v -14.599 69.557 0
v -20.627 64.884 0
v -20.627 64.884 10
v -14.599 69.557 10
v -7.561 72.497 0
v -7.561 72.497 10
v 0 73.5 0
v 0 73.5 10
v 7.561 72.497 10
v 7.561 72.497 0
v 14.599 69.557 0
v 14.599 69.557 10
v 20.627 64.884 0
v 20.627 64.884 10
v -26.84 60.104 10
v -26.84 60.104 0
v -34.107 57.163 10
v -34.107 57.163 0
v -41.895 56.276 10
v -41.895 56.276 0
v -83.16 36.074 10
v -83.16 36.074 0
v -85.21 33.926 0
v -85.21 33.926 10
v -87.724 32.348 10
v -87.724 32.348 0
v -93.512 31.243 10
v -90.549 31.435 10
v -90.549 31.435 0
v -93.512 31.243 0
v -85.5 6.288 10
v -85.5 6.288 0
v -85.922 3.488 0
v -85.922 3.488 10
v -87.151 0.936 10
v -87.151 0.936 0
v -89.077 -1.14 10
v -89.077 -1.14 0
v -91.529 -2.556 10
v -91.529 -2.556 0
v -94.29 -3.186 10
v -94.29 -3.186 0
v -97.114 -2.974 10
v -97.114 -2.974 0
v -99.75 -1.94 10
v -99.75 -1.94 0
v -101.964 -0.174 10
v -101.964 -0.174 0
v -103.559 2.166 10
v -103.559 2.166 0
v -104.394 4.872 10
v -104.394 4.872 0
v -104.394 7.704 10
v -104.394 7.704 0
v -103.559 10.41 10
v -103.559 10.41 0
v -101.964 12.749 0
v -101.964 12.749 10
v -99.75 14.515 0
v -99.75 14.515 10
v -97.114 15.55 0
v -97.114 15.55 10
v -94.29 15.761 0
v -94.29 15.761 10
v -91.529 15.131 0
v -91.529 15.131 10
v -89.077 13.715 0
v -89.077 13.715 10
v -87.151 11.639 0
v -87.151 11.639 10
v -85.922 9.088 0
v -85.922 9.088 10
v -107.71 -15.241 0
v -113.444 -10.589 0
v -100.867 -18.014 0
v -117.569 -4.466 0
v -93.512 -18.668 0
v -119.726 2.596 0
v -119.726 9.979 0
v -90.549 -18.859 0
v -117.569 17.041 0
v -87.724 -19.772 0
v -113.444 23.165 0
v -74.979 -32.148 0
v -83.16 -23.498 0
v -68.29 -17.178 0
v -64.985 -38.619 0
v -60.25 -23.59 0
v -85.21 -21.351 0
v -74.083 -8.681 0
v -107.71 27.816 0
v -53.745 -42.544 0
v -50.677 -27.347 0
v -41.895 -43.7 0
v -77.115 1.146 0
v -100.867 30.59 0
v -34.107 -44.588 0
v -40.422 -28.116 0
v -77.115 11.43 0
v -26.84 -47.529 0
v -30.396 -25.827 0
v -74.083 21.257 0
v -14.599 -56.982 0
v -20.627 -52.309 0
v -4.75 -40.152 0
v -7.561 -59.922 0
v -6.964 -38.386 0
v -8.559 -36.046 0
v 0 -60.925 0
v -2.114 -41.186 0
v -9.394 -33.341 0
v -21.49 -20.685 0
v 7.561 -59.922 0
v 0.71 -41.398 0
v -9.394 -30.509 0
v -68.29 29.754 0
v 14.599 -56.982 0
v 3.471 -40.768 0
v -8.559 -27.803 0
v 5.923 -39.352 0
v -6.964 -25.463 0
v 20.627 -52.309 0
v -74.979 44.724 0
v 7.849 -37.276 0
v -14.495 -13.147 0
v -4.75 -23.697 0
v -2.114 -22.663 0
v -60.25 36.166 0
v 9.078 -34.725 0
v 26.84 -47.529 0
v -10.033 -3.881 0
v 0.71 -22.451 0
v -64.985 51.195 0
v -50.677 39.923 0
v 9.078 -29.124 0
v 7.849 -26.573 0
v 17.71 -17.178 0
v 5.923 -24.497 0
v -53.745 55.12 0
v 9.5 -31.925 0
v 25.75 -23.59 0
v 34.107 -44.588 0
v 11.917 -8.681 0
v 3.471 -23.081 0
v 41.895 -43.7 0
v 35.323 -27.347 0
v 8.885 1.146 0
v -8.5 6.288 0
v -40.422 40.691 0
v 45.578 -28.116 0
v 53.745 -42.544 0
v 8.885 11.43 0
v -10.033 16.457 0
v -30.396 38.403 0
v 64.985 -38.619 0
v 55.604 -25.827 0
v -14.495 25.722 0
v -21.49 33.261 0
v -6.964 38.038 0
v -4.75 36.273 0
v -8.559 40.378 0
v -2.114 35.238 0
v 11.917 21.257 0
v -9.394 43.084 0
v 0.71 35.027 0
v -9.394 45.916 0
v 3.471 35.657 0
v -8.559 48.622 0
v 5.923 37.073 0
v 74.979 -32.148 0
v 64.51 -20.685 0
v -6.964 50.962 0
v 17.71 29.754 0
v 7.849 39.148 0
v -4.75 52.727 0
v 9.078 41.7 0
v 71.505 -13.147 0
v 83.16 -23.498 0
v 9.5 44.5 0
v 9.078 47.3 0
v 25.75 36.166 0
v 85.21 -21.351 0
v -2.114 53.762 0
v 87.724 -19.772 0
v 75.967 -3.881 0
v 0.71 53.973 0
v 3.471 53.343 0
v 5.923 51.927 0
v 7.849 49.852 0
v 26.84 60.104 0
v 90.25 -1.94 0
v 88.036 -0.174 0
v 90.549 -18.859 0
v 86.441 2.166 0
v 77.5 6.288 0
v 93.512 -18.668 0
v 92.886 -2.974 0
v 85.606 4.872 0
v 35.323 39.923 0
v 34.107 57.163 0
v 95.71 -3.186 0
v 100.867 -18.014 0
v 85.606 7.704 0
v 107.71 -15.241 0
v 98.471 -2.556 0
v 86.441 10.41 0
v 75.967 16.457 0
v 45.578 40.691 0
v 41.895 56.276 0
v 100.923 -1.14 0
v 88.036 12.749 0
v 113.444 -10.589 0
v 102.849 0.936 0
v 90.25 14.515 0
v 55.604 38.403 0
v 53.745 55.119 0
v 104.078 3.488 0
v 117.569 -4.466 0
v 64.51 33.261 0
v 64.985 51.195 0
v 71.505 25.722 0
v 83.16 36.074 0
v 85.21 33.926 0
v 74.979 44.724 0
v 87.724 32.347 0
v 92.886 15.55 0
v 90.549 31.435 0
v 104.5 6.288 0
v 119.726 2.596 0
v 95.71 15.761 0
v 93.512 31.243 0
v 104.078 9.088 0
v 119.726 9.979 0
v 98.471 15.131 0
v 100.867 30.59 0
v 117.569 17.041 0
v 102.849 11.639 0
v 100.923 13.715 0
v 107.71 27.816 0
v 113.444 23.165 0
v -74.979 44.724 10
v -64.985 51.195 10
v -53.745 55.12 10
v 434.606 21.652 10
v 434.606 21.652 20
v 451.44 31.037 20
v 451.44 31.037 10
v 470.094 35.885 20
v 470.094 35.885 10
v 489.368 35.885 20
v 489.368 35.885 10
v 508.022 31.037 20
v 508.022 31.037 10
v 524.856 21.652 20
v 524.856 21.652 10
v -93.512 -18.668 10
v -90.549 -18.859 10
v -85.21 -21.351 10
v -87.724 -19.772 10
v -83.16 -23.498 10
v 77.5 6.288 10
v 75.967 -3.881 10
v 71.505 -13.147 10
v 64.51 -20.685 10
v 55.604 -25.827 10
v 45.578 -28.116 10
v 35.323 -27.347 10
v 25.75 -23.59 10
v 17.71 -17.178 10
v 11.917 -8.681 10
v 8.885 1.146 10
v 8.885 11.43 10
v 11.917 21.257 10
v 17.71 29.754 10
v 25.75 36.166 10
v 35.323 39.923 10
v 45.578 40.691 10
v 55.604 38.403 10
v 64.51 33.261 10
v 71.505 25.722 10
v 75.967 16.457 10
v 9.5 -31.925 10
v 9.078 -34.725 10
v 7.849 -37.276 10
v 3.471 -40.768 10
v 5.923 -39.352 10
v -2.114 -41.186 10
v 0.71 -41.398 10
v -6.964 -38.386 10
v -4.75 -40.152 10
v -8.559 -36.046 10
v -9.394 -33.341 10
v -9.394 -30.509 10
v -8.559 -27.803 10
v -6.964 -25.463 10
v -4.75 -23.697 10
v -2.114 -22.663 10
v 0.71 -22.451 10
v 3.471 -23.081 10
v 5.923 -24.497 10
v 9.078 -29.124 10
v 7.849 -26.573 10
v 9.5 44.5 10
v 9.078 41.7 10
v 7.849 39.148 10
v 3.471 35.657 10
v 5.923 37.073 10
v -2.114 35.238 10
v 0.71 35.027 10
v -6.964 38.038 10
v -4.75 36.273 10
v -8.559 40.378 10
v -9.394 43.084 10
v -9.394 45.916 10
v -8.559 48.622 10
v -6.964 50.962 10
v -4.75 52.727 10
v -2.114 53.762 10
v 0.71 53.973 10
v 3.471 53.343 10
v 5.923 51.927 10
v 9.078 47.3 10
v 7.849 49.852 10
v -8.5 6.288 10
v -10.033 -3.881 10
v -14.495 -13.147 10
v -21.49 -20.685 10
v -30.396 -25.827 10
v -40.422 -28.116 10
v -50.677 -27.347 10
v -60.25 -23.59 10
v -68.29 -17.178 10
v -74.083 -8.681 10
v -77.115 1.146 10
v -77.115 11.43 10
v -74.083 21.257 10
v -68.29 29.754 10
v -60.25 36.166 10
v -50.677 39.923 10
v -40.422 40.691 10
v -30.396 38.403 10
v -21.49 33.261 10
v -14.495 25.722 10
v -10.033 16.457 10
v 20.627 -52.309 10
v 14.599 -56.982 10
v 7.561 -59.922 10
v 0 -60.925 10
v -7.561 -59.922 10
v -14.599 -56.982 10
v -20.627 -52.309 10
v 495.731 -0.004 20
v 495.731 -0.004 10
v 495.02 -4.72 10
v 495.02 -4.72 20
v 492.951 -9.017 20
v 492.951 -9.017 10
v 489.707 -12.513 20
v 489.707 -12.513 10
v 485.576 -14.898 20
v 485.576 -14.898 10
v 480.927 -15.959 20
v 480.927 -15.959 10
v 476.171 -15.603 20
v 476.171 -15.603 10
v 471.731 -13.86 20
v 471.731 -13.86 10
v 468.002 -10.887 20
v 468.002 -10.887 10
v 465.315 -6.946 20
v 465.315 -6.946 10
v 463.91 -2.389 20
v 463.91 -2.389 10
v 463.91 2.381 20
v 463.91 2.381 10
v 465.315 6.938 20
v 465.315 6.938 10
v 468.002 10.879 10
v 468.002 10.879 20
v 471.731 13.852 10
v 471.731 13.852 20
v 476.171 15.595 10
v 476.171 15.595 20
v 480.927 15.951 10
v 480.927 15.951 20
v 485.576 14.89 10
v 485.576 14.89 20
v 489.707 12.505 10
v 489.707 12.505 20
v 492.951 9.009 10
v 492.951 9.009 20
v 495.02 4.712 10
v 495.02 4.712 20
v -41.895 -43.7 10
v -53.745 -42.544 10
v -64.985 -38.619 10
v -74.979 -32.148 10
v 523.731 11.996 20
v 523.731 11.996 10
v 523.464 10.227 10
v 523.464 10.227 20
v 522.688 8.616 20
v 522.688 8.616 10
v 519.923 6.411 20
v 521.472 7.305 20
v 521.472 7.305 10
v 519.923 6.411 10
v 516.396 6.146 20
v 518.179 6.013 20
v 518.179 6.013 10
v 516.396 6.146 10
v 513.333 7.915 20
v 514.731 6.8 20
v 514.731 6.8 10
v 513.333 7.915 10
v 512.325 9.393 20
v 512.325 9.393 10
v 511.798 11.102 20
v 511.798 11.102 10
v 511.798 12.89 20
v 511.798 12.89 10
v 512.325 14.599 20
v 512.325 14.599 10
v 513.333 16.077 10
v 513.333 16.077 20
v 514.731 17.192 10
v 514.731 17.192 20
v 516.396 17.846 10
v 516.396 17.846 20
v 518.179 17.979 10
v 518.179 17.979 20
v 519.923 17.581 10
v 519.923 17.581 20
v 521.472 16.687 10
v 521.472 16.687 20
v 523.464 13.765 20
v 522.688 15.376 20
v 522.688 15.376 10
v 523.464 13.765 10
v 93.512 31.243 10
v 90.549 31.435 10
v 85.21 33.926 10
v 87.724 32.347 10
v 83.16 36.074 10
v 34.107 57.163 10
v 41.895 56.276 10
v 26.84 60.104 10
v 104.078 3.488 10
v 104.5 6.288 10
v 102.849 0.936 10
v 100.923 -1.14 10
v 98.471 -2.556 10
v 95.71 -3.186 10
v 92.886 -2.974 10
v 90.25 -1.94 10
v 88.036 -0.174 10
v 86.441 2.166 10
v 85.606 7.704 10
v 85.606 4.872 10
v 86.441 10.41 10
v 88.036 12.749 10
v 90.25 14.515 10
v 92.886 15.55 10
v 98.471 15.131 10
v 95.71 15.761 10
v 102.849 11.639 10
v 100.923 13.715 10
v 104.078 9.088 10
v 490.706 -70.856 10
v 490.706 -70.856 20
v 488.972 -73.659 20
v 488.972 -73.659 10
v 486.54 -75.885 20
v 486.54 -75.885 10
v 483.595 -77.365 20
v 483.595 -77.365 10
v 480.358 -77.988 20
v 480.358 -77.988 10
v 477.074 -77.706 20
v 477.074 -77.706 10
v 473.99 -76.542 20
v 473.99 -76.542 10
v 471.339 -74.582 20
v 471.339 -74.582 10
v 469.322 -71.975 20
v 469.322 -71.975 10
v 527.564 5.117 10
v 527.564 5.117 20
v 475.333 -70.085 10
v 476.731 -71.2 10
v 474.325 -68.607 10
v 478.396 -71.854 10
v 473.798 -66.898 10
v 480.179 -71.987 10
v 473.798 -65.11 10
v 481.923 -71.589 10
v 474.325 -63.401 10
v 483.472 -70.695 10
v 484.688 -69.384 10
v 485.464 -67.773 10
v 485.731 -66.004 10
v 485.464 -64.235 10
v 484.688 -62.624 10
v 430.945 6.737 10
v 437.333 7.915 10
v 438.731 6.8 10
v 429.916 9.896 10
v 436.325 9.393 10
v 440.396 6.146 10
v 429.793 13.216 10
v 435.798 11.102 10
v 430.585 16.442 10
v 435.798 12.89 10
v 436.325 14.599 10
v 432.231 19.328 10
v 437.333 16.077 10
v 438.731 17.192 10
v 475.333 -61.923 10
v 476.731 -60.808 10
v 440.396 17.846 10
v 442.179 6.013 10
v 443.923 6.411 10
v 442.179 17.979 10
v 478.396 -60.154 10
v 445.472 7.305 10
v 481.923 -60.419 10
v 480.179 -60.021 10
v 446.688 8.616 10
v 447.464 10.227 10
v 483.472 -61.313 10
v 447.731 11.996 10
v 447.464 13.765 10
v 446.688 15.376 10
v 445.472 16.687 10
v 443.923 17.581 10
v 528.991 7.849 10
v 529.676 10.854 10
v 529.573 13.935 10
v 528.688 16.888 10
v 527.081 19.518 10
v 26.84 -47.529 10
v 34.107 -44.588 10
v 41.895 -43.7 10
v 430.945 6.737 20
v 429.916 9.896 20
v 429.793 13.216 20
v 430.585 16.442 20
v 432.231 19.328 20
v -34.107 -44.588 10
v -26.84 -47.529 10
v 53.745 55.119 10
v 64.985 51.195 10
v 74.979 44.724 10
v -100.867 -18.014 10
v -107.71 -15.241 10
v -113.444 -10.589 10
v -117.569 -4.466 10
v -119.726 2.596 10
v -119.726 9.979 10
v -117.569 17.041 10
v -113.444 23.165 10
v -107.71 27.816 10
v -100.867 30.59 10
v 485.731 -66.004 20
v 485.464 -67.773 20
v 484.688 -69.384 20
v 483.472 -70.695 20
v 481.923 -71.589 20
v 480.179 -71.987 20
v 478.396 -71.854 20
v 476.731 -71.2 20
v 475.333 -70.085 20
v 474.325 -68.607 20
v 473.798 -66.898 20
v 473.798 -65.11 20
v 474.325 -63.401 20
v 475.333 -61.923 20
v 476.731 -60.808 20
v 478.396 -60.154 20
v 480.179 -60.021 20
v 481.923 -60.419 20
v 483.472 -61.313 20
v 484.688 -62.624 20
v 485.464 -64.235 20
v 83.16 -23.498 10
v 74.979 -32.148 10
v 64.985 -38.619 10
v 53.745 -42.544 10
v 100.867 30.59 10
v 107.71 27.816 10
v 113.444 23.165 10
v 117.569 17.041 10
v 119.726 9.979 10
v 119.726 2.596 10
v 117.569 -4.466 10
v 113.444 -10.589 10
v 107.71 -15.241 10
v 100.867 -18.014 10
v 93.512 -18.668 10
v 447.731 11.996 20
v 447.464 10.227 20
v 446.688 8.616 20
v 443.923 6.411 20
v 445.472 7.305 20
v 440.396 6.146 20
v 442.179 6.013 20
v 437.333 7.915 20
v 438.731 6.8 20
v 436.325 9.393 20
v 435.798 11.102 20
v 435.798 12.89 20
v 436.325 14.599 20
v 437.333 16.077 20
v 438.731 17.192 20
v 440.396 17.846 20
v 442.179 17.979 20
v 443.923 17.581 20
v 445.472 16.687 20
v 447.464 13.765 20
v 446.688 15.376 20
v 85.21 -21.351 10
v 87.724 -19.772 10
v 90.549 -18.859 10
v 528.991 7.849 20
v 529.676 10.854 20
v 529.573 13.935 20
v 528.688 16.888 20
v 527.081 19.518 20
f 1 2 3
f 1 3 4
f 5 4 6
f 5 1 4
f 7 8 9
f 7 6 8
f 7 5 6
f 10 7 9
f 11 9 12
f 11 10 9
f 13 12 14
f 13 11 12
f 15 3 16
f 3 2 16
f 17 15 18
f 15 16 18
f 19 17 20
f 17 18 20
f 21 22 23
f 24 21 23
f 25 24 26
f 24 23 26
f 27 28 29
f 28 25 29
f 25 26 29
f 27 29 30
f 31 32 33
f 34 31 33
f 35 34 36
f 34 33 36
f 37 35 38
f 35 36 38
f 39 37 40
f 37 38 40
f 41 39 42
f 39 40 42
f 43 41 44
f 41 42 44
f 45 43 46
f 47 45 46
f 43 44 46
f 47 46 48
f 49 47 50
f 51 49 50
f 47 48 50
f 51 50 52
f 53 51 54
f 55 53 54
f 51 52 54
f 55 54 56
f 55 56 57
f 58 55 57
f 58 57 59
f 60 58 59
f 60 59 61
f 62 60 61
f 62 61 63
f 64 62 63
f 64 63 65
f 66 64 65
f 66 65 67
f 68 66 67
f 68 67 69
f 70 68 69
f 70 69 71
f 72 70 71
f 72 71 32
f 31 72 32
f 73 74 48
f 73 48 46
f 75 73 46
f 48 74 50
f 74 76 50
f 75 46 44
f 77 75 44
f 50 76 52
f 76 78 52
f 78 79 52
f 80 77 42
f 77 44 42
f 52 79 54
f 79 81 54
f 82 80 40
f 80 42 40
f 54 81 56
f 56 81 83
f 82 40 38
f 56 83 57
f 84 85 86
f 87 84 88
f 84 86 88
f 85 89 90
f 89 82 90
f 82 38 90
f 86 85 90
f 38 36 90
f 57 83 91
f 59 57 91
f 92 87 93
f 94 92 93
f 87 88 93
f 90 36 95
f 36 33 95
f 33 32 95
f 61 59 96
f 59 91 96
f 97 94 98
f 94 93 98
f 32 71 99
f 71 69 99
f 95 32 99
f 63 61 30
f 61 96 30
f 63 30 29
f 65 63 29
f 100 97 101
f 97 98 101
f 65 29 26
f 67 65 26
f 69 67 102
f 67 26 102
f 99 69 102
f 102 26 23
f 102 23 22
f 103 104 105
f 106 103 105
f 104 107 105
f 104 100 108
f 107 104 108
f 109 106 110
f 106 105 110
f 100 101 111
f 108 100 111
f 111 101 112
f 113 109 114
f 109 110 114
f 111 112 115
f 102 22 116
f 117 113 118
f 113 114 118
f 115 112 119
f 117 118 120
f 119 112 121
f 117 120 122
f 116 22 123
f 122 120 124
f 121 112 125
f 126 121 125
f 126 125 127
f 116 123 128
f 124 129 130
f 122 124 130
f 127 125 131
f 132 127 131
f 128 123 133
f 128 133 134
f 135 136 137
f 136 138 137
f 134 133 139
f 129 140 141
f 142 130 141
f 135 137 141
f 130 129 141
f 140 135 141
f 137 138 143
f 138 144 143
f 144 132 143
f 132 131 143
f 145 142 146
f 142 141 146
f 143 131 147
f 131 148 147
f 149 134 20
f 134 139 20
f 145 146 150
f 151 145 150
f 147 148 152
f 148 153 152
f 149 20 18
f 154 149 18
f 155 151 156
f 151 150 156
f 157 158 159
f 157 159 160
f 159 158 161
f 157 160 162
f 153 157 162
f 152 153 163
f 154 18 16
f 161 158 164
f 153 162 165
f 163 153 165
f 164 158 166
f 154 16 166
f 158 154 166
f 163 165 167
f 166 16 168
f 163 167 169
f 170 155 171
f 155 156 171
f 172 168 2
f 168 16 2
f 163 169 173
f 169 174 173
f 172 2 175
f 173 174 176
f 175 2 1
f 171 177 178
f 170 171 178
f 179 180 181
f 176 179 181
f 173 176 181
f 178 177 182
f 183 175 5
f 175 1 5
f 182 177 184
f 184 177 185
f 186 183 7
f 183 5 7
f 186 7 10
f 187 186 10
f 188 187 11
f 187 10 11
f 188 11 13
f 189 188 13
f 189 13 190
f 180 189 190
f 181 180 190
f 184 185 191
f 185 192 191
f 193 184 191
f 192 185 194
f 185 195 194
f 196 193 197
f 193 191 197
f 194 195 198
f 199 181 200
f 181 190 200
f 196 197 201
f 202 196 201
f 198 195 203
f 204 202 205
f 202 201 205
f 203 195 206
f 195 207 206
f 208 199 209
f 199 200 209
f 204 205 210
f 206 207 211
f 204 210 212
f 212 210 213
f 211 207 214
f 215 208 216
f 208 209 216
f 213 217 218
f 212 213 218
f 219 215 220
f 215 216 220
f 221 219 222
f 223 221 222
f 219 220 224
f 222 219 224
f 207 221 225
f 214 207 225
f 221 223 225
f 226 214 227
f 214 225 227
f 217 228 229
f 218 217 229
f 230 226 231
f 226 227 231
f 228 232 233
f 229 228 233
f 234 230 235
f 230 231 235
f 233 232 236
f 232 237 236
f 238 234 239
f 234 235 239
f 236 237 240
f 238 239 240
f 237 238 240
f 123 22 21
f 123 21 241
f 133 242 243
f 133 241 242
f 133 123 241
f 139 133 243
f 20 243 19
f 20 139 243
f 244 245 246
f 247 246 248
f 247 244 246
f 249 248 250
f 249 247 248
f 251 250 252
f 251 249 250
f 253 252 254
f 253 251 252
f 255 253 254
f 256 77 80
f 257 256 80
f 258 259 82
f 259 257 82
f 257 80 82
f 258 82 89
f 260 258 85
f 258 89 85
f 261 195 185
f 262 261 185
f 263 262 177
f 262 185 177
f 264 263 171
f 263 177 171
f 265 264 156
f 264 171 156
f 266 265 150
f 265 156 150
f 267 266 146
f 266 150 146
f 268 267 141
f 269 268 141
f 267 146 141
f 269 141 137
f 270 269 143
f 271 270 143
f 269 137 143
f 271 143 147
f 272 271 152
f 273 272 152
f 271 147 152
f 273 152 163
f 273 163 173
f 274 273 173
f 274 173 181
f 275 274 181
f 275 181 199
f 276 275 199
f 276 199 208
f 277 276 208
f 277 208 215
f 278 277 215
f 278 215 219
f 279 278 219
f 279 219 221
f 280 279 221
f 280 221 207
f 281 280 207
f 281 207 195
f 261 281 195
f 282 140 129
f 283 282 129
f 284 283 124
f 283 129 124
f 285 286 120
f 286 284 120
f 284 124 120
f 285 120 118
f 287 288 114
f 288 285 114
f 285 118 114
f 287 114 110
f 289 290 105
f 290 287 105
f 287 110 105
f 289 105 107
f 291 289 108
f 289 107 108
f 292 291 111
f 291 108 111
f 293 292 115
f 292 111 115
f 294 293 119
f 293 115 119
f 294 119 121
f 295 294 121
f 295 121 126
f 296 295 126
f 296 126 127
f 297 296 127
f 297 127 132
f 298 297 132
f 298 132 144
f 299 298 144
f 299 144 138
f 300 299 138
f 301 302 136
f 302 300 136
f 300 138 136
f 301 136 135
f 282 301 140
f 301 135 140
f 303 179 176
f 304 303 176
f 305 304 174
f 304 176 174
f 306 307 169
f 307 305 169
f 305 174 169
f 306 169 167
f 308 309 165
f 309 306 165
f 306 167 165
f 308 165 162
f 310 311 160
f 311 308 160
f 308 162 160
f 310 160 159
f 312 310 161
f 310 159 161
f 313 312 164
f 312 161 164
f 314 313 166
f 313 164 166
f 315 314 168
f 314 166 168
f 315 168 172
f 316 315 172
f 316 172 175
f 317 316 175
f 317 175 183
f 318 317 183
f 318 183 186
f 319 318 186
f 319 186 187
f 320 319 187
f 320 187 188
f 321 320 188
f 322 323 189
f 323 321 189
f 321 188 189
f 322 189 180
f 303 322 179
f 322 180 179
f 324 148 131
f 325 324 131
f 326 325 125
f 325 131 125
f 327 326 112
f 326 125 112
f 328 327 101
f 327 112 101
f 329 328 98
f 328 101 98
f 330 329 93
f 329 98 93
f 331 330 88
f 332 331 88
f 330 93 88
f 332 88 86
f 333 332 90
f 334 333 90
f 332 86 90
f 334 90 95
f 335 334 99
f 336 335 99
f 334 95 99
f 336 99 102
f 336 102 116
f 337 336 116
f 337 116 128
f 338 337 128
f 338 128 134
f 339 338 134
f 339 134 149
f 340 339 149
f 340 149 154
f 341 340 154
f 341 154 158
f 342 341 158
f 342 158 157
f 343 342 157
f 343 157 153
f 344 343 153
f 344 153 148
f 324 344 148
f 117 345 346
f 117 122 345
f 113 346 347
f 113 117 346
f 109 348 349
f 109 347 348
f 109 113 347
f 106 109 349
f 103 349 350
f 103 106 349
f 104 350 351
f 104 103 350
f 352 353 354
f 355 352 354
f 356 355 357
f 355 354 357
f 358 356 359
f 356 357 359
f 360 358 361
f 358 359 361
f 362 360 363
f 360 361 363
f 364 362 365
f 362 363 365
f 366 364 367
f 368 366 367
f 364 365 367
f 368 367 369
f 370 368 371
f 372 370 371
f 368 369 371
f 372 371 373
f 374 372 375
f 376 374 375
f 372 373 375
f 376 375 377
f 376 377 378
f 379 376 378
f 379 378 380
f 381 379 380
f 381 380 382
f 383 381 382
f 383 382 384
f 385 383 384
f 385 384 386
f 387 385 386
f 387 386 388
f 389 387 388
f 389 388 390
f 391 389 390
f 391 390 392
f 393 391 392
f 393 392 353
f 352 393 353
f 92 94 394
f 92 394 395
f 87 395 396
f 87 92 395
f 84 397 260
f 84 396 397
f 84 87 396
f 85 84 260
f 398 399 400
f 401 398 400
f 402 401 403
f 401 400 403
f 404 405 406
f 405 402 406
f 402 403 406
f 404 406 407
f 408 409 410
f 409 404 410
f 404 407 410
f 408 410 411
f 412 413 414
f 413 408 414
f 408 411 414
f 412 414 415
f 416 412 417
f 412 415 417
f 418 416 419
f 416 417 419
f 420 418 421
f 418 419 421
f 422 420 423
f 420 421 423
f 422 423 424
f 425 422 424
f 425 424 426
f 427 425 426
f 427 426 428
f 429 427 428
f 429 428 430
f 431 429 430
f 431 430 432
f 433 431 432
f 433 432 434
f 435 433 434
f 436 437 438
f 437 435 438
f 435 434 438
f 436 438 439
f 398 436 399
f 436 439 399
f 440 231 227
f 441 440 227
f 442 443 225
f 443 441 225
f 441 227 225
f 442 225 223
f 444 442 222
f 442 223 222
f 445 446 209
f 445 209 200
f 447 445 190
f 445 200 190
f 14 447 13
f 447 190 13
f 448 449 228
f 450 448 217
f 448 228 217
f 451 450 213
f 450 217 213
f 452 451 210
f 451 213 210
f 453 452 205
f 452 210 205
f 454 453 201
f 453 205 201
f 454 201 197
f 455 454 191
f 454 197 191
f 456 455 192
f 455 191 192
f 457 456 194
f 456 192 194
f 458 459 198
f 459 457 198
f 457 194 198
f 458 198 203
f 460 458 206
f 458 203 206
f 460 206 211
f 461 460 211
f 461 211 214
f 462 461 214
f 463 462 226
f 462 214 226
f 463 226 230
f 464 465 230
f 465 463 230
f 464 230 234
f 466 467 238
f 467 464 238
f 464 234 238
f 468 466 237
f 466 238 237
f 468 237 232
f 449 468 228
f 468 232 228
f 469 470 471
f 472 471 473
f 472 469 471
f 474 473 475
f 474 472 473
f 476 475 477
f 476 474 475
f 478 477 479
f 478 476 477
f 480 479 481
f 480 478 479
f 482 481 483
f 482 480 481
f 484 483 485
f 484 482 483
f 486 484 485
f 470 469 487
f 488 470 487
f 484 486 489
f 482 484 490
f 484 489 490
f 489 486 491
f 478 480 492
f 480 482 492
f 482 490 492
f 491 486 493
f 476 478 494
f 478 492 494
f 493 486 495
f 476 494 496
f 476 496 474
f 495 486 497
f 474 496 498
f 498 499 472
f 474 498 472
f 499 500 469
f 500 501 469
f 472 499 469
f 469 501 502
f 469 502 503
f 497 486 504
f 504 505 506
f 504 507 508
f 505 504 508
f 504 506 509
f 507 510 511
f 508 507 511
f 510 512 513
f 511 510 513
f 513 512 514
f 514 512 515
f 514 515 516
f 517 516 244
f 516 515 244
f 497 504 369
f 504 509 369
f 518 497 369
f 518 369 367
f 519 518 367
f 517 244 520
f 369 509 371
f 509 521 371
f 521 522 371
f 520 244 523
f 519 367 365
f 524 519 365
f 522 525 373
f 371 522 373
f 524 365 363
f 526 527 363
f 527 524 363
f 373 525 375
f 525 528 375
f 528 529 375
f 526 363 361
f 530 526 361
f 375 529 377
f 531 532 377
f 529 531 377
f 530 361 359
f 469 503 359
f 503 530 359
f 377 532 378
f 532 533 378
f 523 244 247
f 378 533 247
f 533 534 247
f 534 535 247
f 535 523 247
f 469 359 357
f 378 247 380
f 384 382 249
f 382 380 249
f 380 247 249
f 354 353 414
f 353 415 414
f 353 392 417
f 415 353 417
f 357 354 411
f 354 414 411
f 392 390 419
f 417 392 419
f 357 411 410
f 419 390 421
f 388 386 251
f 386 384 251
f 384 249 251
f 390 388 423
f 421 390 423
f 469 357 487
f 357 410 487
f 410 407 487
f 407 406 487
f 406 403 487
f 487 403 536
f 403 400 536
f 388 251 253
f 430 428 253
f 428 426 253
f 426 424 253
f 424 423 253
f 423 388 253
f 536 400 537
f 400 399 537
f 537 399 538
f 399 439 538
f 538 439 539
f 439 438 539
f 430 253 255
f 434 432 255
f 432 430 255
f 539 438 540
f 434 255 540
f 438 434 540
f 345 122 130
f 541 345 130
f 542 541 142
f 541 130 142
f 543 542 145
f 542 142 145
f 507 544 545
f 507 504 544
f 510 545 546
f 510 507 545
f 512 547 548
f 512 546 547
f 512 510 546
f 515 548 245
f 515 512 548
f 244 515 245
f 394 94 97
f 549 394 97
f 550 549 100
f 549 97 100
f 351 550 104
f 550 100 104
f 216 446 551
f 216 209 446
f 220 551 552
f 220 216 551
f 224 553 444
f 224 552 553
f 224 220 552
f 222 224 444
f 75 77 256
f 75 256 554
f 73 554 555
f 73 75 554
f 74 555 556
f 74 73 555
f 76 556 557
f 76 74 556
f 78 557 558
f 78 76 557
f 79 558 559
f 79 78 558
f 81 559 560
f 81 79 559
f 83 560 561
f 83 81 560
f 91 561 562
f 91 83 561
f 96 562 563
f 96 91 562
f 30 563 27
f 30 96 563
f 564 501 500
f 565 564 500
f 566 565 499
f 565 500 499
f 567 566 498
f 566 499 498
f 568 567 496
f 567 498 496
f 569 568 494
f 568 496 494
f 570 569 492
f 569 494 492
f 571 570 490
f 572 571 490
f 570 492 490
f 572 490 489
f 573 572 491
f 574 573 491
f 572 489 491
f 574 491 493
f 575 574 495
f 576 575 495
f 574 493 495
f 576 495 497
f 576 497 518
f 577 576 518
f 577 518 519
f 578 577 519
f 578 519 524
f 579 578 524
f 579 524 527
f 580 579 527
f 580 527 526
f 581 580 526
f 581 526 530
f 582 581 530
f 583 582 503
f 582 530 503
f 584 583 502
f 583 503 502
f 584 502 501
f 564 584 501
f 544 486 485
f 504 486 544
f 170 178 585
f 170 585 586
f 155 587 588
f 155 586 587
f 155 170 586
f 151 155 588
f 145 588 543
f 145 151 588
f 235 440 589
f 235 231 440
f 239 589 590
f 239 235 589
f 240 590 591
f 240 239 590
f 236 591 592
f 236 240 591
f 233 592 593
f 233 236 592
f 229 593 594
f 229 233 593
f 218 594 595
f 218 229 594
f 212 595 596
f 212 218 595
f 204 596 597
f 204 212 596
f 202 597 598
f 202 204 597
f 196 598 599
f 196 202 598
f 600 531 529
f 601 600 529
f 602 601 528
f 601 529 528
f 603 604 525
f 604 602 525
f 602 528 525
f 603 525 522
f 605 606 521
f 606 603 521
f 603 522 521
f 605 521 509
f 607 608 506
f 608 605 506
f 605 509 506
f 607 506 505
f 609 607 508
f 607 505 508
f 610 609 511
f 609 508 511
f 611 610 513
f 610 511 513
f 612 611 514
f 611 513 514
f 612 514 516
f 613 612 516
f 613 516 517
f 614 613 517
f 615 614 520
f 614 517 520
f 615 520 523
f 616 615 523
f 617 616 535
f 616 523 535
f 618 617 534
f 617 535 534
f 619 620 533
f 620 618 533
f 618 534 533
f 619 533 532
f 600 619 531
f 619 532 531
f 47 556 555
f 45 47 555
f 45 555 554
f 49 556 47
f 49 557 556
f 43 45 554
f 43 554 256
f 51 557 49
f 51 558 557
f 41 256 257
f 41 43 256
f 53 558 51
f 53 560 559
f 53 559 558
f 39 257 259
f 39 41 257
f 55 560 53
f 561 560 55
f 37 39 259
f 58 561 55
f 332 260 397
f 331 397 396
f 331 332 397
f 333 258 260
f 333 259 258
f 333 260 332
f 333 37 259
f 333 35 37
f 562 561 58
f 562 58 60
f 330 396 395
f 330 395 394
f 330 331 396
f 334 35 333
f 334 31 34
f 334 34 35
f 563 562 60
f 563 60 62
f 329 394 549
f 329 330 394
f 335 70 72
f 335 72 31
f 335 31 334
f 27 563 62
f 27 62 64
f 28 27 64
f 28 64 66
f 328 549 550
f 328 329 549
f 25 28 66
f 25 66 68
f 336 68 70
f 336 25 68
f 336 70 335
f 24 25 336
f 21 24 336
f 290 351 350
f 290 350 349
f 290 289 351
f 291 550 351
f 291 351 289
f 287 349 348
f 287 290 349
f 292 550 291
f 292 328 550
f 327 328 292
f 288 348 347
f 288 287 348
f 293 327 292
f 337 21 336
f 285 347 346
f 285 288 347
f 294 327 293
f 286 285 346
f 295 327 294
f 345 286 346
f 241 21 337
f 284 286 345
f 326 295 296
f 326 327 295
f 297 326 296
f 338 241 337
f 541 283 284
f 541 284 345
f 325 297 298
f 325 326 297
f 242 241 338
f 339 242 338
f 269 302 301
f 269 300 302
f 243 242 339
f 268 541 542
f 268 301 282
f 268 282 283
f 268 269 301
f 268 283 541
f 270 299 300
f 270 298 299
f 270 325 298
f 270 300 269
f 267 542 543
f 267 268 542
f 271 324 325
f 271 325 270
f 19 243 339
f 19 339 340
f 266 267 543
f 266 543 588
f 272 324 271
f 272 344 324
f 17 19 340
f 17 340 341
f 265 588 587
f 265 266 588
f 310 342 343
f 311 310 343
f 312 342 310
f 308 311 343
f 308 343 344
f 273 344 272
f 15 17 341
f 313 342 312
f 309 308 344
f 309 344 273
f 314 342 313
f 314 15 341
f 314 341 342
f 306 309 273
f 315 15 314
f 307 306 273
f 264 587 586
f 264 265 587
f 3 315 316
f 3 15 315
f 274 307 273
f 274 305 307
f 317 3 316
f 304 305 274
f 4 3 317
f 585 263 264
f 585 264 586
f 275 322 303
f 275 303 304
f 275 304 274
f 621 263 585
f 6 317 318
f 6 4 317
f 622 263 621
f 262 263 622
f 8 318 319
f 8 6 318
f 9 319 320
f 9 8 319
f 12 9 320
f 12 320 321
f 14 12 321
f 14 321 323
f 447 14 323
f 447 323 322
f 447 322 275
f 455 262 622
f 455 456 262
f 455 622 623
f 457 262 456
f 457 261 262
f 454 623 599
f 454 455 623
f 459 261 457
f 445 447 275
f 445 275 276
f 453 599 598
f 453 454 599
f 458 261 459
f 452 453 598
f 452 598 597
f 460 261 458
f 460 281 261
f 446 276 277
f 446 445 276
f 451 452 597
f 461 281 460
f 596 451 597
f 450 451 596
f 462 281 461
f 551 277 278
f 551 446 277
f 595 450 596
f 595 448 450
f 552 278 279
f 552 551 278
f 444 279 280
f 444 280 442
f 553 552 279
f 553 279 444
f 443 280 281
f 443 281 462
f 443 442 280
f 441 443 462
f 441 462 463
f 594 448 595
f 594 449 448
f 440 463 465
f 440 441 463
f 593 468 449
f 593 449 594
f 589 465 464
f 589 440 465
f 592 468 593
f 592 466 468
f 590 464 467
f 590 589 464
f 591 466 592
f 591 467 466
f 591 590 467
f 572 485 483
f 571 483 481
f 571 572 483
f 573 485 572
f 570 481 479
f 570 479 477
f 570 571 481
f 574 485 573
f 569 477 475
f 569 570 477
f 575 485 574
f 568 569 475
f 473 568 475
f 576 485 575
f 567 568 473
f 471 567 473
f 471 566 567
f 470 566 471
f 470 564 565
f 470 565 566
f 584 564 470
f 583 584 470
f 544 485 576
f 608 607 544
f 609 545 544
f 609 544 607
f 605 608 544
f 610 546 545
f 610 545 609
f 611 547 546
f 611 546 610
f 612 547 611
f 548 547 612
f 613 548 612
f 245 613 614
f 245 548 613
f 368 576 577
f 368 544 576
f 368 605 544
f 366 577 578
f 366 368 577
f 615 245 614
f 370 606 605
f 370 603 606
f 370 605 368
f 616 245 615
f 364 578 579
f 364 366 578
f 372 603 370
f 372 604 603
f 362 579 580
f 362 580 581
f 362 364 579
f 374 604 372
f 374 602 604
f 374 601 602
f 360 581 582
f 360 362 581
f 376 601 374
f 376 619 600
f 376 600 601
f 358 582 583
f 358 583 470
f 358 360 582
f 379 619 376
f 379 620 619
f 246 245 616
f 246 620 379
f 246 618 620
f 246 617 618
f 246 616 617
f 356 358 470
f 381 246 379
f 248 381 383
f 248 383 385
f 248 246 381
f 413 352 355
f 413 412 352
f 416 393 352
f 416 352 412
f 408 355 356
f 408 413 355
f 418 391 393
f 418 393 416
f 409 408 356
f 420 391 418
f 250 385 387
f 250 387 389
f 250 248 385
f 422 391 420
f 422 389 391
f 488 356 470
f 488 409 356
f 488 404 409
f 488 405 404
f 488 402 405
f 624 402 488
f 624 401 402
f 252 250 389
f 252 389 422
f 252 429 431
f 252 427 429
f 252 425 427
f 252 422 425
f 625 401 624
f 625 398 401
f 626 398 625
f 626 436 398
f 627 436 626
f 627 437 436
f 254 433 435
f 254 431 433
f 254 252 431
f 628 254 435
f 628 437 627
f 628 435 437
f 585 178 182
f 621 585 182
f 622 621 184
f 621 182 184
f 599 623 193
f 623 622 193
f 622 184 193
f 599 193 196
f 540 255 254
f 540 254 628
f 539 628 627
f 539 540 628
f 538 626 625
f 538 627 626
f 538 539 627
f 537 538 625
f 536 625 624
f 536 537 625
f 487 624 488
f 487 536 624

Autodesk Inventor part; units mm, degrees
ref_plane "YZ Plane" through (0, 0, 0) normal (1, 0, 0) x (0, 1, 0)
ref_plane "XZ Plane" through (0, 0, 0) normal (0, 1, 0) x (-1, 0, 0)
ref_plane "XY Plane" through (0, 0, 0) normal (0, 0, 1) x (1, 0, 0)
sketch "스케치1" plane through (0, 0, 0) normal (0, 0, 1) x (1, 0, 0)
  circle A0 centre (43, 6.2877) radius 34.5
  circle A1 centre (-43, 6.2877) radius 34.5
  line L0 (-163.8708, 6.2877) -> (265.4786, 6.2877)
  circle A2 centre (95, 6.2877) radius 9.5
  circle A3 centre (-95, 6.2877) radius 9.5
  arc A4 (-93.5122, 31.2434) -> (-93.5122, -18.668) centre (-95, 6.2877) ccw
  arc A5 (93.5122, -18.668) -> (93.5122, 31.2434) centre (95, 6.2877) ccw
  line L1 (0, 109.3123) -> (0, -138.0954) construction
  arc A6 (-83.1597, -23.4981) -> (-93.5122, -18.668) centre (-92.7981, -30.6467) ccw
  arc A7 (93.5122, -18.668) -> (83.1597, -23.4981) centre (92.7981, -30.6467) ccw
  arc A8 (20.6273, 64.8842) -> (41.8953, 56.2755) centre (41.2545, 85.2684) ccw
  circle A9 centre (0, 44.5) radius 9.5
  circle A10 centre (0, -31.9246) radius 9.5
  arc A11 (-41.8953, 56.2755) -> (-20.6273, 64.8842) centre (-41.2545, 85.2684) ccw
  arc A12 (41.8953, -43.7001) -> (20.6273, -52.3088) centre (41.2545, -72.693) ccw
  arc A13 (-20.6273, -52.3088) -> (-41.8953, -43.7001) centre (-41.2545, -72.693) ccw
  arc A14 (83.1597, 36.0735) -> (93.5122, 31.2434) centre (92.7981, 43.2221) ccw
  arc A15 (-93.5122, 31.2434) -> (-83.1597, 36.0735) centre (-92.7981, 43.2221) ccw
  arc A16 (20.6273, 64.8842) -> (-20.6273, 64.8842) centre (0, 44.5) ccw
  arc A17 (-41.8953, 56.2755) -> (-83.1597, 36.0735) centre (-43, 6.2877) ccw
  arc A18 (-83.1597, -23.4981) -> (-41.8953, -43.7001) centre (-43, 6.2877) ccw
  arc A19 (83.1597, 36.0735) -> (41.8953, 56.2755) centre (43, 6.2877) ccw
  arc A20 (41.8953, -43.7001) -> (83.1597, -23.4981) centre (43, 6.2877) ccw
  arc A21 (-20.6273, -52.3088) -> (20.6273, -52.3088) centre (0, -31.9246) ccw
  point P0 (0, 0)
  point P1 (-42.3827, -0.6468)
  dimension "d0" = 69
  dimension "d1" = 69
  dimension "d5" = 19
  dimension "d8" = 19
  dimension "d9" = 95
  dimension "d11" = 95
  dimension "d15" = 50
  dimension "d16" = 50
  dimension "d19" = 43
  dimension "d20" = 43
  dimension "d25" = 24
  dimension "d26" = 24
  dimension "d27" = 58
  dimension "d28" = 19
  dimension "d30" = 44.5
  dimension "d34" = 58
  dimension "d35" = 58
  dimension "d36" = 58
  dimension "d37" = 24
  dimension "d38" = 24
extrude "돌출1" add sketch "스케치1" along normal blind 10 contours L0 A2 A5 A7 A20 A12 A21 A13 A18 A6 A4 A3 A1 A0 | A0 L0 A1 A3 A4 A15 A17 A11 A16 A8 A19 A14 A5 A2
sketch "스케치2" plane through (0, 0, 10) normal (0, 0, 1) x (1, 0, 0)
  point P0 (0, 0)
sketch "스케치3" plane through (0, 0, 10) normal (0, 0, 1) x (1, 0, 0)
  point P0 (0, 0)
sketch "스케치4" plane through (0, 0, 10) normal (0, 0, 1) x (1, 0, 0)
  line L0 (479.7309, 137.7571) -> (479.7309, -142.8376)
  line L1 (343.2747, -0.004) -> (642.8719, -0.004)
  circle A0 centre (479.7309, -0.004) radius 16
  circle A1 centre (479.7309, -66.004) radius 6
  circle A2 centre (517.7309, 11.996) radius 6
  circle A3 centre (441.7309, 11.996) radius 6
  arc A4 (468.6161, -70.5273) -> (490.7063, -70.8558) centre (479.7309, -66.004) ccw
  arc A5 (527.5635, 5.1171) -> (524.8559, 21.6518) centre (517.7309, 11.996) ccw
  arc A6 (434.6059, 21.6518) -> (430.9447, 6.737) centre (441.7309, 11.996) ccw
  line L2 (469.3219, -71.975) -> (430.9447, 6.737)
  line L3 (490.7063, -70.8558) -> (527.5635, 5.1171)
  arc A7 (524.8559, 21.6518) -> (434.6059, 21.6518) centre (479.7309, -39.5016) ccw
  point P0 (0, 0)
  dimension "d41" = 32
  dimension "d42" = 12
  dimension "d43" = 66
  dimension "d44" = 12
  dimension "d45" = 38
  dimension "d46" = 12
  dimension "d47" = 24
  dimension "d48" = 24
  dimension "d49" = 24
  dimension "d50" = 152
extrude "돌출2" add sketch "스케치4" along normal blind 10 contours A7 A5 L3 L1 A0 L0 | L0 A0 L1 L2 A6 A7 | L1 L3 A4 L0 A1 A0 | A0 L0 A1 A4 L2 L1
sketch "스케치5" plane through (0, 0, 20) normal (0, 0, 1) x (1, 0, 0)
  point P0 (0, 0)
properties part number "240412_sketch"
